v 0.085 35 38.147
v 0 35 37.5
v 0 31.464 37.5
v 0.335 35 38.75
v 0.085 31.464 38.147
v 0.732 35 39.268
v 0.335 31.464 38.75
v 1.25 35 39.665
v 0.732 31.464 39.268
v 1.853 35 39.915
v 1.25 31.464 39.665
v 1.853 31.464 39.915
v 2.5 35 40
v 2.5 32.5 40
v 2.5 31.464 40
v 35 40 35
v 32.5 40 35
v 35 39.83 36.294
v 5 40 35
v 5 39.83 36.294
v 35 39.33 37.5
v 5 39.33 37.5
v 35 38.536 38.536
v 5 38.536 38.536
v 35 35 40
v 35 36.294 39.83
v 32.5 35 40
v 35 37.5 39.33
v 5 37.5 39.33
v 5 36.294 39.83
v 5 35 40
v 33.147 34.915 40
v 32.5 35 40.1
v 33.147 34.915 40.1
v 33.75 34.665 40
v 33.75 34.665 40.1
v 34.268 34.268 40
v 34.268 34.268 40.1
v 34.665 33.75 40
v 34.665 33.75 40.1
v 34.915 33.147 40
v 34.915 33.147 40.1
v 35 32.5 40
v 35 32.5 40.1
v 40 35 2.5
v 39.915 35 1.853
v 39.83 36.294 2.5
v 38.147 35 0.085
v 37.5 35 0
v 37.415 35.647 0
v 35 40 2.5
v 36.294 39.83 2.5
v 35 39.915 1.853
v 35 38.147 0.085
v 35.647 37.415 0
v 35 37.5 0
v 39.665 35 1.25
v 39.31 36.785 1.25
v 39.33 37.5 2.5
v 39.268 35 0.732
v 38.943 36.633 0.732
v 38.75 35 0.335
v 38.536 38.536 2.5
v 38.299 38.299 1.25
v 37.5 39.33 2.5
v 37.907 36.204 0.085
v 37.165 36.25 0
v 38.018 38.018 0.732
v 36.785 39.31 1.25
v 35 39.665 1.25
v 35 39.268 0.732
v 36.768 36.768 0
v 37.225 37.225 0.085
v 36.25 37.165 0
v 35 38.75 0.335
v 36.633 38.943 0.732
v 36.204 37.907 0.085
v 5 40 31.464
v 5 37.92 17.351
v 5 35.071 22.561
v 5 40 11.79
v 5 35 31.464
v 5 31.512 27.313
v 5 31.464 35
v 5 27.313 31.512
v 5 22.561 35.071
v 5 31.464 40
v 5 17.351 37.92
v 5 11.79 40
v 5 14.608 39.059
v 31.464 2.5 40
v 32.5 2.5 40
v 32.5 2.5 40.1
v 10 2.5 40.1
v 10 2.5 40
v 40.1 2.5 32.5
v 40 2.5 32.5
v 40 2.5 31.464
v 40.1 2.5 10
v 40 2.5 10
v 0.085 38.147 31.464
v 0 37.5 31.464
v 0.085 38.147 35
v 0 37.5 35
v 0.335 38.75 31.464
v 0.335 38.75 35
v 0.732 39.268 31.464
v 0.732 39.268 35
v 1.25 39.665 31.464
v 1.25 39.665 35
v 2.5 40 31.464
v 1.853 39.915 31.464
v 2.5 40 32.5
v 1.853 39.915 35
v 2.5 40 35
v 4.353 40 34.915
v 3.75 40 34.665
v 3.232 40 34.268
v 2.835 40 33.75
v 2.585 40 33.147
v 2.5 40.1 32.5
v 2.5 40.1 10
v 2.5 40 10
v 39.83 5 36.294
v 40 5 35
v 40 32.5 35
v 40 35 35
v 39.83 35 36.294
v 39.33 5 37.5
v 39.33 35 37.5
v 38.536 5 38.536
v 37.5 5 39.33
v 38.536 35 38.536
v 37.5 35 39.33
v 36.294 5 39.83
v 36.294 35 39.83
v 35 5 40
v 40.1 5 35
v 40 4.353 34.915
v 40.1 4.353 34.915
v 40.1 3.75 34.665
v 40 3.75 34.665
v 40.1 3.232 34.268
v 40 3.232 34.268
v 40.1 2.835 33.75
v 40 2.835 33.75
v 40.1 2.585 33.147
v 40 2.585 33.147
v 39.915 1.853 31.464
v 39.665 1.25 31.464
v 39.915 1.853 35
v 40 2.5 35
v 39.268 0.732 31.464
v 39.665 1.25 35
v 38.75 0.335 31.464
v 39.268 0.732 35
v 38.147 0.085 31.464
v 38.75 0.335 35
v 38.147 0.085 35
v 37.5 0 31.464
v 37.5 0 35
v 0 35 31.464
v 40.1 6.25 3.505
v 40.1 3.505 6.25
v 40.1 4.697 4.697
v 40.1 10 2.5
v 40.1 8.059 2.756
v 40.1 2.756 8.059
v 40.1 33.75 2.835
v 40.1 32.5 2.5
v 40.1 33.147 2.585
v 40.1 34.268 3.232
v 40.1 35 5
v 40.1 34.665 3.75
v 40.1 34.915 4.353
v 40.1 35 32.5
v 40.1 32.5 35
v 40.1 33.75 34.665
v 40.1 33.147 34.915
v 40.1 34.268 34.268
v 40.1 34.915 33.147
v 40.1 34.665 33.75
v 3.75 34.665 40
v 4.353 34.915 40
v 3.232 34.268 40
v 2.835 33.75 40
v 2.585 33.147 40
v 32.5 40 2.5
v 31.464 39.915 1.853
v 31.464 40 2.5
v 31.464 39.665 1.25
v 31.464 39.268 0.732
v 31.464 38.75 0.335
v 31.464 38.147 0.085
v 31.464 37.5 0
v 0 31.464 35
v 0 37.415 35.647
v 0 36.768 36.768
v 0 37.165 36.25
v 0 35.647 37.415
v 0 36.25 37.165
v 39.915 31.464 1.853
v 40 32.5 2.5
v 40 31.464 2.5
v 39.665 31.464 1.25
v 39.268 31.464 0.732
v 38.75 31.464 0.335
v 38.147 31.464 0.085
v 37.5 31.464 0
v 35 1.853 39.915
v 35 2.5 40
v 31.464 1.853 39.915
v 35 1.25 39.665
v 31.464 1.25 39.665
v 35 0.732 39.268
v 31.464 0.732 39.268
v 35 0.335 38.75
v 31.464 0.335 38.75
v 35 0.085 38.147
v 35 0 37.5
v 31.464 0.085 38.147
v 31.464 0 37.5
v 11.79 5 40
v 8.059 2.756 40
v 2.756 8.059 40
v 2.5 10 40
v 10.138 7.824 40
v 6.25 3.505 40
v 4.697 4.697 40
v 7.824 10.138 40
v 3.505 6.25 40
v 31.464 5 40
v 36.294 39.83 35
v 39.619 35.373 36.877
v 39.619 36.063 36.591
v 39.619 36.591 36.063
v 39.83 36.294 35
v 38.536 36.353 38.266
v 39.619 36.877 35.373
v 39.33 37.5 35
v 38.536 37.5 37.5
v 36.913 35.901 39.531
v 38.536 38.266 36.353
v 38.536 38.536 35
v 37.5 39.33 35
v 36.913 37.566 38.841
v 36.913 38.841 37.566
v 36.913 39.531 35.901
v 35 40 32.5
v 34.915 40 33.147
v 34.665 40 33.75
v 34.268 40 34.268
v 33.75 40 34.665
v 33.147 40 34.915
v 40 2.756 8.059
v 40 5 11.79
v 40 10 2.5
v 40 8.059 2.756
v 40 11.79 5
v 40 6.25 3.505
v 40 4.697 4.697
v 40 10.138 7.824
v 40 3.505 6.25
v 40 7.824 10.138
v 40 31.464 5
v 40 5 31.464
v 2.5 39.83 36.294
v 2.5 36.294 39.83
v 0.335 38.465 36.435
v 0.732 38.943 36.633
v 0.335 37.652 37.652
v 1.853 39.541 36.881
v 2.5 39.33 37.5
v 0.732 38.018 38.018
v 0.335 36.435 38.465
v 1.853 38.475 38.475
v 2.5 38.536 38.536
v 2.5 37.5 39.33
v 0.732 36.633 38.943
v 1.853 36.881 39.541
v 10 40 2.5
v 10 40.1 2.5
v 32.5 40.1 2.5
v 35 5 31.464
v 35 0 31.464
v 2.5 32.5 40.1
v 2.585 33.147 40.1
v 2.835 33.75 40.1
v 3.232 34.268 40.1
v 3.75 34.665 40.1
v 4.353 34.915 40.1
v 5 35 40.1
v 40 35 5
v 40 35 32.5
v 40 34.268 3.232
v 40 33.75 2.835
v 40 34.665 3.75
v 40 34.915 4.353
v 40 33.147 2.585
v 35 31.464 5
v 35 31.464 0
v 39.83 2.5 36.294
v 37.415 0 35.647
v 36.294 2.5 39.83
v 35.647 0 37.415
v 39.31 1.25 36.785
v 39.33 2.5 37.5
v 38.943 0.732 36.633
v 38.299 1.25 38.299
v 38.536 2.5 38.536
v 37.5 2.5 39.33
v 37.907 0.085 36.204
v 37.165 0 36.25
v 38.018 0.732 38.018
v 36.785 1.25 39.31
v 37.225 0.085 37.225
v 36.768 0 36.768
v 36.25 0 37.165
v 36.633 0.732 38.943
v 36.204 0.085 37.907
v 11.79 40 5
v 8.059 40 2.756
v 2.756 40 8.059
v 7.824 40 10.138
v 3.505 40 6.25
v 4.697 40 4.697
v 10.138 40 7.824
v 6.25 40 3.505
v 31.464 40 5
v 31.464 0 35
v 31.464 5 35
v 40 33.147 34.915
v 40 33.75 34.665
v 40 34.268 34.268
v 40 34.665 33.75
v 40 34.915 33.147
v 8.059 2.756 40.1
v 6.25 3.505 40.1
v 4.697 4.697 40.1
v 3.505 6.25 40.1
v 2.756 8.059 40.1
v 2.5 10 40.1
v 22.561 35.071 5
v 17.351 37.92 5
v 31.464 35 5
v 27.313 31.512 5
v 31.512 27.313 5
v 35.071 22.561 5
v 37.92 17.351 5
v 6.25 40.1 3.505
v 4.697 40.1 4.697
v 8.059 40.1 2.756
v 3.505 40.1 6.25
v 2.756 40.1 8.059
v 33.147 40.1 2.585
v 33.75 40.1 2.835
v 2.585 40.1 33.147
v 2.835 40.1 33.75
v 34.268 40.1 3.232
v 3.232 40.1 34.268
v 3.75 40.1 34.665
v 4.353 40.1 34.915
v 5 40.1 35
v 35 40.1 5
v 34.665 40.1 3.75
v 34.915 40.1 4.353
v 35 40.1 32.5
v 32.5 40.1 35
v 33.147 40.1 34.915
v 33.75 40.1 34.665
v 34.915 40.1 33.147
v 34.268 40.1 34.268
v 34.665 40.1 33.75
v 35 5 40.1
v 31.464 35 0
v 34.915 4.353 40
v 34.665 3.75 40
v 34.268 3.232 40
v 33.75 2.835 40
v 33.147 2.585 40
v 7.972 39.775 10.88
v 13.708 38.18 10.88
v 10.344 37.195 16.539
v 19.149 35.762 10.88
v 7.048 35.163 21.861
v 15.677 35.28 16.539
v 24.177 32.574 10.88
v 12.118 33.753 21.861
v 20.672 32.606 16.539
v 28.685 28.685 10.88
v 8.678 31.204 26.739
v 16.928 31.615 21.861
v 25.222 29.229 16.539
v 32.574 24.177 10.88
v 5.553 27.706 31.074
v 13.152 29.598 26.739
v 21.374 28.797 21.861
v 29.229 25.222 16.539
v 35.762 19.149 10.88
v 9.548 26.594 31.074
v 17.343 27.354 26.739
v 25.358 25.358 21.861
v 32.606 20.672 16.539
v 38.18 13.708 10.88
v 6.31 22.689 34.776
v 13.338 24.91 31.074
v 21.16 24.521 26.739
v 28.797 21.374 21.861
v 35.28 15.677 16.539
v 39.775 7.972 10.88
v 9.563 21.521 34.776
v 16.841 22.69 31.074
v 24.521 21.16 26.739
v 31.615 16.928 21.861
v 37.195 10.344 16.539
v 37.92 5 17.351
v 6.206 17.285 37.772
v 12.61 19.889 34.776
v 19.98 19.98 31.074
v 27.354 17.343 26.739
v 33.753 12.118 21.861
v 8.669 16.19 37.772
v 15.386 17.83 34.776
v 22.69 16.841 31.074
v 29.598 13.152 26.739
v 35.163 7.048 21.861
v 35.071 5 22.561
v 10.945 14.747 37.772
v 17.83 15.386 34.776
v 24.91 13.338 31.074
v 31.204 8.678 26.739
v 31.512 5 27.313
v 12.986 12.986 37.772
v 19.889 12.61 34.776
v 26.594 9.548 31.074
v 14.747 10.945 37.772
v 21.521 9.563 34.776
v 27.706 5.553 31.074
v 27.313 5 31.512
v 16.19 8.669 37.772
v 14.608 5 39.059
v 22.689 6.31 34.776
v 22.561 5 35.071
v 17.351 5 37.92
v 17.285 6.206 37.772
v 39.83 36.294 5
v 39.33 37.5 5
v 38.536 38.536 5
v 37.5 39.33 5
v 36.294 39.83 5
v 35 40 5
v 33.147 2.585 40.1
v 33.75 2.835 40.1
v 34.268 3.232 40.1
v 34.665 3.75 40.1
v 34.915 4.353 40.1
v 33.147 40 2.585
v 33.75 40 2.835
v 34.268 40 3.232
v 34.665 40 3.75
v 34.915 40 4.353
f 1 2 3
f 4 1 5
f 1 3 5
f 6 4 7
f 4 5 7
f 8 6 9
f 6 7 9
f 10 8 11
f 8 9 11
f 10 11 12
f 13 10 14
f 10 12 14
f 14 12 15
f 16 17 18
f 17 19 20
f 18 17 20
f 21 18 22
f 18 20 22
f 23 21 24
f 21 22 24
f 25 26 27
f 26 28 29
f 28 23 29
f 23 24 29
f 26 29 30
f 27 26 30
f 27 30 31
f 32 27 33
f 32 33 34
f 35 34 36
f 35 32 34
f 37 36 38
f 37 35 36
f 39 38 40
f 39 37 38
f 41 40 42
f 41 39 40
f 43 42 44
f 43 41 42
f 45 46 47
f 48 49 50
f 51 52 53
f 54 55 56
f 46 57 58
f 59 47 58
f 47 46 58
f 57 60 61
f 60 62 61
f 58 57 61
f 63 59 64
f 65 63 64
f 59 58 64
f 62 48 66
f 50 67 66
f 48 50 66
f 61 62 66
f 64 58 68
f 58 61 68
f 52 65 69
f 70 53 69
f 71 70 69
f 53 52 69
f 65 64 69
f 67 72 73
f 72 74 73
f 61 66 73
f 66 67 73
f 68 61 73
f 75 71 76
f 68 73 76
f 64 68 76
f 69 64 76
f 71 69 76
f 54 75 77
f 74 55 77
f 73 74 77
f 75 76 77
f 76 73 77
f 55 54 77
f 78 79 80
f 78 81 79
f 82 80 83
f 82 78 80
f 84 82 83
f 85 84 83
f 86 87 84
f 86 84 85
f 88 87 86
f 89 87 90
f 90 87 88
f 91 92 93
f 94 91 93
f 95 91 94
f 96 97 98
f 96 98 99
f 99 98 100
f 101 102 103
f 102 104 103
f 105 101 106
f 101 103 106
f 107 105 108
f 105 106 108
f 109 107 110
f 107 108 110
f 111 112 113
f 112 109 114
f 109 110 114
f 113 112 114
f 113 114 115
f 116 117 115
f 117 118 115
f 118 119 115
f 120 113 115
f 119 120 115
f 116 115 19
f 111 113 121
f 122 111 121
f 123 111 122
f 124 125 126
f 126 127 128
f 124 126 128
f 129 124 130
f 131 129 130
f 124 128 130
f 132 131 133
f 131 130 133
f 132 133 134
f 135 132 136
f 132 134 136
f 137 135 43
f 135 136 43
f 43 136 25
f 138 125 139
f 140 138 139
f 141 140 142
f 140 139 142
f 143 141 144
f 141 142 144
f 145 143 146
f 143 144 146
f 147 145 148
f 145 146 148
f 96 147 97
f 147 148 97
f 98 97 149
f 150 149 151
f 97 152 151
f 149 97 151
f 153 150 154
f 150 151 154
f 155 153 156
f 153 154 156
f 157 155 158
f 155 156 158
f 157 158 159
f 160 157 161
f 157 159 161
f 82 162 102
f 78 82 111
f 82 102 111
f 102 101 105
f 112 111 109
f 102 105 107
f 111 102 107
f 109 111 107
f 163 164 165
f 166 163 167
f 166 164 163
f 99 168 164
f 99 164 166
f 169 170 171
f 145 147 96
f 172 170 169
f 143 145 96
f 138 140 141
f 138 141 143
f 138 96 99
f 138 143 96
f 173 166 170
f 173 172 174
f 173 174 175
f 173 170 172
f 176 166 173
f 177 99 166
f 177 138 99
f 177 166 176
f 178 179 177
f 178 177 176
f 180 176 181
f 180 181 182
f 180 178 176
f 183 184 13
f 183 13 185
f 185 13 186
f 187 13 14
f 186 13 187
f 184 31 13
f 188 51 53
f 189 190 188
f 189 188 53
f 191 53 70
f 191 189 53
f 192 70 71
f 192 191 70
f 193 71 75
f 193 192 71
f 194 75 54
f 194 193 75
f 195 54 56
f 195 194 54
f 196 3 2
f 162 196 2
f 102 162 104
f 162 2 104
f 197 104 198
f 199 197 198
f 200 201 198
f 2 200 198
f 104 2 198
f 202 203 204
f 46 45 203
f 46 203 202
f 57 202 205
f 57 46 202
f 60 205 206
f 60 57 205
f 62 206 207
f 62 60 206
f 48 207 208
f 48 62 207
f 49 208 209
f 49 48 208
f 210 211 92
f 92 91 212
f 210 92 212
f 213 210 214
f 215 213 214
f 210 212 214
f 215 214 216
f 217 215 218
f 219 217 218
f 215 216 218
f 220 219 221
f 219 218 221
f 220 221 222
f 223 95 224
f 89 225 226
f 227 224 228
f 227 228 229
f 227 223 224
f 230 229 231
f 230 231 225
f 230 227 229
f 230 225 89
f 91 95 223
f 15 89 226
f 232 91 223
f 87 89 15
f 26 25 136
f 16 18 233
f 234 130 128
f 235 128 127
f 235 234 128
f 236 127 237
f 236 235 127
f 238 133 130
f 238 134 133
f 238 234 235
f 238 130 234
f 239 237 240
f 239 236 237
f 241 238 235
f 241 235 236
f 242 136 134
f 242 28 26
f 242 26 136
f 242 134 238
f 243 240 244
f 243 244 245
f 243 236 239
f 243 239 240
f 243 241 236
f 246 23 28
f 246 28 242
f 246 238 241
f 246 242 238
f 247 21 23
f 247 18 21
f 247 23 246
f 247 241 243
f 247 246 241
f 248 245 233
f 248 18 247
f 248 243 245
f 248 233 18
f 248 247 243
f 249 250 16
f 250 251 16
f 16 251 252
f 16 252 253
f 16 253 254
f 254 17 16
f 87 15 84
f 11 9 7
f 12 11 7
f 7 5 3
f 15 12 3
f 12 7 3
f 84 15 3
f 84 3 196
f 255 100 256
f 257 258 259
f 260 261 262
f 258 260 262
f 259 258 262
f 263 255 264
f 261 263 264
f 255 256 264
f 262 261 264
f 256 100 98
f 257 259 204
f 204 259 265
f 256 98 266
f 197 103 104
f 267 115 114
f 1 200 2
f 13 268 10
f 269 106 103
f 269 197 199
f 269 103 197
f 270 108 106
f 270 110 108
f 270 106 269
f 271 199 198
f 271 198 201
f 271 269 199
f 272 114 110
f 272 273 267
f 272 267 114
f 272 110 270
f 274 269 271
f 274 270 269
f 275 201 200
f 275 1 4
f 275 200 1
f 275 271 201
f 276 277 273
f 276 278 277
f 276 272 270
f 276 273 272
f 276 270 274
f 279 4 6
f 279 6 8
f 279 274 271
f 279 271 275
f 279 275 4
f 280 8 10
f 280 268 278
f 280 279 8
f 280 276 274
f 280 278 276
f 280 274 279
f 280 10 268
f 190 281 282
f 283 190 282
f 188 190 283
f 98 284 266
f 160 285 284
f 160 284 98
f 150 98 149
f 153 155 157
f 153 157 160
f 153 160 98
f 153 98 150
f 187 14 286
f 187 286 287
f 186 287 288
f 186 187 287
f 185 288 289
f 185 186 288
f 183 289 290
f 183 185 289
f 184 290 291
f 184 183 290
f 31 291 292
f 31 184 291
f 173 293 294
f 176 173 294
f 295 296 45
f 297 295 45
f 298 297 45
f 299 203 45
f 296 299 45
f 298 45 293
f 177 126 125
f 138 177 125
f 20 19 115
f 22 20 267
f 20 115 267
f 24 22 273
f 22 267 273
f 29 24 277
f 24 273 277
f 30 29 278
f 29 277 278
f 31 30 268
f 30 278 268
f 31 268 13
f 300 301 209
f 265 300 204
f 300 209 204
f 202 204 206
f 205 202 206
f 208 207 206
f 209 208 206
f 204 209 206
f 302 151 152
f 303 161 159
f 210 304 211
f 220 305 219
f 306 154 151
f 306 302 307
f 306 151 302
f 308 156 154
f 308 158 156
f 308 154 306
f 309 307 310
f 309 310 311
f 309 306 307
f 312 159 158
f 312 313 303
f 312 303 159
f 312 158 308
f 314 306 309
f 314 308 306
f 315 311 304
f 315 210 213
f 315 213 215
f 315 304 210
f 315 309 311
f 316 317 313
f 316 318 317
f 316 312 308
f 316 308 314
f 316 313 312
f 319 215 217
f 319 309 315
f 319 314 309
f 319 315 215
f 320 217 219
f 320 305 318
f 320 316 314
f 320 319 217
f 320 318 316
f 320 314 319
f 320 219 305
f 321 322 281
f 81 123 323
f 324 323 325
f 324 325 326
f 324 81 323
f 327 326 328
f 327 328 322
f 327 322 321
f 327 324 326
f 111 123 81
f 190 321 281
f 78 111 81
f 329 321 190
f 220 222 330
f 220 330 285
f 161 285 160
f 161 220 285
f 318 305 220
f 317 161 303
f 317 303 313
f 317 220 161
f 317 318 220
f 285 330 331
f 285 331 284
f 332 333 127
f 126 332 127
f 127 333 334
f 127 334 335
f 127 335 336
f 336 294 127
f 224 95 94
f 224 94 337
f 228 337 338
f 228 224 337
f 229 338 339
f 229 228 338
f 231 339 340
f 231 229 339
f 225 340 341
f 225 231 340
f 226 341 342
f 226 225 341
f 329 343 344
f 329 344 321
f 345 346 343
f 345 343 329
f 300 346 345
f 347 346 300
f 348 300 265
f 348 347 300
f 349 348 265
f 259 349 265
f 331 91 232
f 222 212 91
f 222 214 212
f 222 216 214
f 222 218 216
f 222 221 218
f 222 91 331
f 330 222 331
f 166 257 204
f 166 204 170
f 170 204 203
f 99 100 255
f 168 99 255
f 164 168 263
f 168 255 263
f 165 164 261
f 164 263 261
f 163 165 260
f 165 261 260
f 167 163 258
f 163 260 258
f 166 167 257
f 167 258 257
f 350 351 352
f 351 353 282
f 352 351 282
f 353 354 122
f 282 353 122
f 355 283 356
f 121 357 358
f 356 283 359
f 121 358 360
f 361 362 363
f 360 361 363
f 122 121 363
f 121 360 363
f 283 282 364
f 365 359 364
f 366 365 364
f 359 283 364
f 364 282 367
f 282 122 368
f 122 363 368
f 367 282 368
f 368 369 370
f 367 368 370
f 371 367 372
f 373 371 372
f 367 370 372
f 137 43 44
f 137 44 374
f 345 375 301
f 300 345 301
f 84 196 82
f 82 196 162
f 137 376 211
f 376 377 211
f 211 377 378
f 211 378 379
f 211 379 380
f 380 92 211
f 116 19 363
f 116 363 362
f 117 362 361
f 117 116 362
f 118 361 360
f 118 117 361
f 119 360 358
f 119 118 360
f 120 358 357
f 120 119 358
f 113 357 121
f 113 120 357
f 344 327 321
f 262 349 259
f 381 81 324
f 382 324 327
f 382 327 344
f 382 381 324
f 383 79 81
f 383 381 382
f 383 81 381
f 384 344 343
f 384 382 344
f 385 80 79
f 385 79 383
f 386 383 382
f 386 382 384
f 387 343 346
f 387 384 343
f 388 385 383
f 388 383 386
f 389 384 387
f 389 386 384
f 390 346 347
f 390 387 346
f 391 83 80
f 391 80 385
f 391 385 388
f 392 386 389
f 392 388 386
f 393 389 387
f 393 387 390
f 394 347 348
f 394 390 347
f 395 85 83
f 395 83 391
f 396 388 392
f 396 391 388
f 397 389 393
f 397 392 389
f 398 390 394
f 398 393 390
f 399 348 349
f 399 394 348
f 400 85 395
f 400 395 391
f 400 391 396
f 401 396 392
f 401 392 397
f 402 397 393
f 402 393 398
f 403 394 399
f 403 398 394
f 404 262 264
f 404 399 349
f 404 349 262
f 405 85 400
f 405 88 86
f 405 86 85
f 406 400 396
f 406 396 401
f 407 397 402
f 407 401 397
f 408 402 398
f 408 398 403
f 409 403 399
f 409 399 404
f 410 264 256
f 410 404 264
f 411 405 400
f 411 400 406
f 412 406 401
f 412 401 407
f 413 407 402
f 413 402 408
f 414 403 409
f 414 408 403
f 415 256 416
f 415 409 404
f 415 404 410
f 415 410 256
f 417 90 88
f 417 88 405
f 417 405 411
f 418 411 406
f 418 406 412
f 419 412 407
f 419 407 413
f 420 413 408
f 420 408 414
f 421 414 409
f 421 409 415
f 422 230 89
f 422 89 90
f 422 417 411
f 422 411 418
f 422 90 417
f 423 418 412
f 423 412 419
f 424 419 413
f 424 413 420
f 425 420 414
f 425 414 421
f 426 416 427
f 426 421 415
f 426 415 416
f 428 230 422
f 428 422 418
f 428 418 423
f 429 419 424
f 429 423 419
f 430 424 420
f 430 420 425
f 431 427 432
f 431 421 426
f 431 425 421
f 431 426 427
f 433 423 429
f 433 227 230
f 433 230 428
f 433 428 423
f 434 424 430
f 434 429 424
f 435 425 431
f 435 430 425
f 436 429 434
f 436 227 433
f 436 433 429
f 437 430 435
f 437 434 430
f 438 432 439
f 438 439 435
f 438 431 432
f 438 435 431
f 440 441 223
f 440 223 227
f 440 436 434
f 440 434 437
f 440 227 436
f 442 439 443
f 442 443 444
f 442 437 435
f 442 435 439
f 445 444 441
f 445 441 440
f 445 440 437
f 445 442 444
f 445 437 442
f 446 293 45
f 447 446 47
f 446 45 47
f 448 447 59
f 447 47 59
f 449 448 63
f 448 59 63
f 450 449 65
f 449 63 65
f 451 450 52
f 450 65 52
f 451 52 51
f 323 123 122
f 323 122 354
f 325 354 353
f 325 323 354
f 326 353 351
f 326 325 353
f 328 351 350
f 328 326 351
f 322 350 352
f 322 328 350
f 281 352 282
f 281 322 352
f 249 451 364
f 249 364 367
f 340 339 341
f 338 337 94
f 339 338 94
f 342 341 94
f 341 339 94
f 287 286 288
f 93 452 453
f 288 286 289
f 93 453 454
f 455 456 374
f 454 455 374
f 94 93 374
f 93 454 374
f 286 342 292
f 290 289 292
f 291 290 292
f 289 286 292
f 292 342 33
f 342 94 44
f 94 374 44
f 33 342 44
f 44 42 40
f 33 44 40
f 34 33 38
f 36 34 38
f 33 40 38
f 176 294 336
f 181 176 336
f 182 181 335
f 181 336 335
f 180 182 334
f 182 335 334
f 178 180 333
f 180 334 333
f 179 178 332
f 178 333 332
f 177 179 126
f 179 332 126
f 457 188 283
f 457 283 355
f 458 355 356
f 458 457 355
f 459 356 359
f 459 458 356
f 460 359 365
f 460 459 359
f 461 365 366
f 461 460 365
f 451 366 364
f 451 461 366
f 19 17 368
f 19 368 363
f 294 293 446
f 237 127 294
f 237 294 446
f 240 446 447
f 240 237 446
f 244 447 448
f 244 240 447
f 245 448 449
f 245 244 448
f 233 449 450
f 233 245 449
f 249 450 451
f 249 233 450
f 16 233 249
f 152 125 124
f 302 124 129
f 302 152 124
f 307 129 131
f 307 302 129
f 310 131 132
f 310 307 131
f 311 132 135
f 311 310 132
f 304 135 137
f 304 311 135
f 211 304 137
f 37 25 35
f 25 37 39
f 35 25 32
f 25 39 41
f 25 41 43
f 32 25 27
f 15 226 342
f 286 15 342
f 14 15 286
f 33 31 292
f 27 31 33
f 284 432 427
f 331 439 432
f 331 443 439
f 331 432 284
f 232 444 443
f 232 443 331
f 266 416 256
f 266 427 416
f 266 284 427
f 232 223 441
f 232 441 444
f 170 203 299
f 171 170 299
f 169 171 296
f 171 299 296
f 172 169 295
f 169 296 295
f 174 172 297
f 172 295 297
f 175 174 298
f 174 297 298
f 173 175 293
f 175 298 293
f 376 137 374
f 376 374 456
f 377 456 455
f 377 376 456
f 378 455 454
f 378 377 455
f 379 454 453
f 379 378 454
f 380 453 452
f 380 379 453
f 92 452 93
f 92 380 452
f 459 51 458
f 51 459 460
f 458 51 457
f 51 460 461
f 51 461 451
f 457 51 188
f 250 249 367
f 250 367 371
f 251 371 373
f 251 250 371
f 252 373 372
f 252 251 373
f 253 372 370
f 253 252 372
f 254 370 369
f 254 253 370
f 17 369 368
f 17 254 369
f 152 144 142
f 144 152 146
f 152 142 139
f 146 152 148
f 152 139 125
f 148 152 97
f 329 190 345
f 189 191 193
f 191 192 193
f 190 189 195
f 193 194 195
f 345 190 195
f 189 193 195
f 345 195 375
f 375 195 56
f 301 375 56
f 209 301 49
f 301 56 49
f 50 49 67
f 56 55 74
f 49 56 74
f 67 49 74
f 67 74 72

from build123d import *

# Parameters (mm, degrees)
SKETCH1_W           = 40
SKETCH1_H           = 40
BOSS_EXTRUDE1_DEPTH = 40
SKETCH4_W           = 40
SKETCH4_H           = 40
CUT_EXTRUDE1_DEPTH  = 5
SKETCH5_W           = 40
SKETCH5_H           = 40
CUT_EXTRUDE2_DEPTH  = 5
SKETCH6_W           = 40
SKETCH6_H           = 40
CUT_EXTRUDE3_DEPTH  = 5
FILLET1_R           = 5
BOSS_EXTRUDE2_START = 5
BOSS_EXTRUDE2_DEPTH = 5
FILLET2_R           = 2.5
BOSS_EXTRUDE3_DEPTH = 0.1


with BuildPart() as part:
    # Sketch1 → Boss-Extrude1 (new body)
    with BuildSketch(Plane(origin=(0, 0, 0), x_dir=(0, 1, 0), z_dir=(0, 0, 1))):
        with Locations((20, -20)):
            Rectangle(SKETCH1_W, SKETCH1_H)
    extrude(amount=BOSS_EXTRUDE1_DEPTH)

    # Sketch2 → Cut-Revolve1 (revolve, cut)
    with BuildSketch(Plane.XZ):
        with BuildLine():
            Line((0, 42), (0, -42))
            ThreePointArc((0, -42), (42, 0), (0, 42))
        make_face()
    revolve(axis=Axis((0, 0, 42), (0, 0, -1)), mode=Mode.SUBTRACT)

    # Sketch4 → Cut-Extrude1 (cut)
    with BuildSketch(Plane.XZ):
        with Locations((20, 20)):
            Rectangle(SKETCH4_W, SKETCH4_H)
    extrude(amount=-CUT_EXTRUDE1_DEPTH, mode=Mode.SUBTRACT)

    # Sketch5 → Cut-Extrude2 (cut)
    with BuildSketch(Plane(origin=(0, 0, 0), x_dir=(0, -1, 0), z_dir=(-1, 0, 0))):
        with Locations((-20, 20)):
            Rectangle(SKETCH5_W, SKETCH5_H)
    extrude(amount=-CUT_EXTRUDE2_DEPTH, mode=Mode.SUBTRACT)

    # Sketch6 → Cut-Extrude3 (cut)
    with BuildSketch(Plane(origin=(0, 0, 0), x_dir=(1, 0, 0), z_dir=(0, 0, -1))):
        with Locations((20, -20)):
            Rectangle(SKETCH6_W, SKETCH6_H)
    extrude(amount=-CUT_EXTRUDE3_DEPTH, mode=Mode.SUBTRACT)

    # Fillet1
    fillet1_edges = [part.edges().sort_by_distance(p)[0] for p in [
        (22.5, 40, 40),
        (40, 22.5, 40),
        (40, 40, 22.5),
    ]]
    fillet(fillet1_edges, radius=FILLET1_R)

    # Sketch7 → Boss-Extrude2 (add)
    with BuildSketch(Plane.XZ.offset(-5).offset(BOSS_EXTRUDE2_START)):
        with BuildLine():
            Line((31.464466094, 40), (31.464466094, 35))
            Line((31.464466094, 35), (35, 31.464466094))
            Line((35, 31.464466094), (40, 31.464466094))
            Line((40, 31.464466094), (40, 35))
            ThreePointArc((40, 35), (38.535533906, 38.535533906), (35, 40))
            Line((35, 40), (31.464466094, 40))
        make_face()
    boss_extrude2 = extrude(amount=-BOSS_EXTRUDE2_DEPTH)

    # Mirror1: Boss-Extrude2 across plane
    add(boss_extrude2.mirror(Plane(origin=(0, 0, 0), x_dir=(0, 0.7071067811865476, 0.7071067811865476), z_dir=(0, 0.7071067811865477, -0.7071067811865475))))

    # Mirror1 at the second plane: Boss-Extrude2 across plane
    add(boss_extrude2.mirror(Plane(origin=(0, 0, 0), x_dir=(0, 0, 1), z_dir=(-0.7071067811865476, 0.7071067811865475, 0))))

    # Fillet2
    fillet2_edges = [part.edges().sort_by_distance(p)[0] for p in [
        (38.535533906, 0, 38.535533906),
        (33.232233047, 0, 40),
        (40, 0, 33.232233047),
        (0, 38.535533906, 38.535533906),
        (0, 40, 33.232233047),
        (0, 33.232233047, 40),
        (38.535533906, 38.535533906, 0),
        (40, 33.232233047, 0),
        (33.232233047, 40, 0),
    ]]
    fillet(fillet2_edges, radius=FILLET2_R)

    # Sketch9 → Boss-Extrude3 (add)
    with BuildSketch(Plane.YZ.offset(40)):
        with BuildLine():
            Line((32.5, 35), (5, 35))
            ThreePointArc((5, 35), (3.232233047, 34.267766953), (2.5, 32.5))
            Line((2.5, 32.5), (2.5, 10))
            ThreePointArc((2.5, 10), (4.696699141, 4.696699141), (10, 2.5))
            Line((10, 2.5), (32.5, 2.5))
            ThreePointArc((32.5, 2.5), (34.267766953, 3.232233047), (35, 5))
            Line((35, 5), (35, 32.5))
            ThreePointArc((35, 32.5), (34.267766953, 34.267766953), (32.5, 35))
        make_face()
    boss_extrude3 = extrude(amount=BOSS_EXTRUDE3_DEPTH)

    # Mirror2: Boss-Extrude3 across plane
    add(boss_extrude3.mirror(Plane(origin=(0, 0, 0), x_dir=(0.7071067811865475, 0, 0.7071067811865476), z_dir=(0.7071067811865478, 0, -0.7071067811865474))))

    # Mirror2 at the second plane: Boss-Extrude3 across plane
    add(boss_extrude3.mirror(Plane(origin=(0, 0, 0), x_dir=(0, 0, 1), z_dir=(-0.7071067811865476, 0.7071067811865475, 0))))


solid = part.part
